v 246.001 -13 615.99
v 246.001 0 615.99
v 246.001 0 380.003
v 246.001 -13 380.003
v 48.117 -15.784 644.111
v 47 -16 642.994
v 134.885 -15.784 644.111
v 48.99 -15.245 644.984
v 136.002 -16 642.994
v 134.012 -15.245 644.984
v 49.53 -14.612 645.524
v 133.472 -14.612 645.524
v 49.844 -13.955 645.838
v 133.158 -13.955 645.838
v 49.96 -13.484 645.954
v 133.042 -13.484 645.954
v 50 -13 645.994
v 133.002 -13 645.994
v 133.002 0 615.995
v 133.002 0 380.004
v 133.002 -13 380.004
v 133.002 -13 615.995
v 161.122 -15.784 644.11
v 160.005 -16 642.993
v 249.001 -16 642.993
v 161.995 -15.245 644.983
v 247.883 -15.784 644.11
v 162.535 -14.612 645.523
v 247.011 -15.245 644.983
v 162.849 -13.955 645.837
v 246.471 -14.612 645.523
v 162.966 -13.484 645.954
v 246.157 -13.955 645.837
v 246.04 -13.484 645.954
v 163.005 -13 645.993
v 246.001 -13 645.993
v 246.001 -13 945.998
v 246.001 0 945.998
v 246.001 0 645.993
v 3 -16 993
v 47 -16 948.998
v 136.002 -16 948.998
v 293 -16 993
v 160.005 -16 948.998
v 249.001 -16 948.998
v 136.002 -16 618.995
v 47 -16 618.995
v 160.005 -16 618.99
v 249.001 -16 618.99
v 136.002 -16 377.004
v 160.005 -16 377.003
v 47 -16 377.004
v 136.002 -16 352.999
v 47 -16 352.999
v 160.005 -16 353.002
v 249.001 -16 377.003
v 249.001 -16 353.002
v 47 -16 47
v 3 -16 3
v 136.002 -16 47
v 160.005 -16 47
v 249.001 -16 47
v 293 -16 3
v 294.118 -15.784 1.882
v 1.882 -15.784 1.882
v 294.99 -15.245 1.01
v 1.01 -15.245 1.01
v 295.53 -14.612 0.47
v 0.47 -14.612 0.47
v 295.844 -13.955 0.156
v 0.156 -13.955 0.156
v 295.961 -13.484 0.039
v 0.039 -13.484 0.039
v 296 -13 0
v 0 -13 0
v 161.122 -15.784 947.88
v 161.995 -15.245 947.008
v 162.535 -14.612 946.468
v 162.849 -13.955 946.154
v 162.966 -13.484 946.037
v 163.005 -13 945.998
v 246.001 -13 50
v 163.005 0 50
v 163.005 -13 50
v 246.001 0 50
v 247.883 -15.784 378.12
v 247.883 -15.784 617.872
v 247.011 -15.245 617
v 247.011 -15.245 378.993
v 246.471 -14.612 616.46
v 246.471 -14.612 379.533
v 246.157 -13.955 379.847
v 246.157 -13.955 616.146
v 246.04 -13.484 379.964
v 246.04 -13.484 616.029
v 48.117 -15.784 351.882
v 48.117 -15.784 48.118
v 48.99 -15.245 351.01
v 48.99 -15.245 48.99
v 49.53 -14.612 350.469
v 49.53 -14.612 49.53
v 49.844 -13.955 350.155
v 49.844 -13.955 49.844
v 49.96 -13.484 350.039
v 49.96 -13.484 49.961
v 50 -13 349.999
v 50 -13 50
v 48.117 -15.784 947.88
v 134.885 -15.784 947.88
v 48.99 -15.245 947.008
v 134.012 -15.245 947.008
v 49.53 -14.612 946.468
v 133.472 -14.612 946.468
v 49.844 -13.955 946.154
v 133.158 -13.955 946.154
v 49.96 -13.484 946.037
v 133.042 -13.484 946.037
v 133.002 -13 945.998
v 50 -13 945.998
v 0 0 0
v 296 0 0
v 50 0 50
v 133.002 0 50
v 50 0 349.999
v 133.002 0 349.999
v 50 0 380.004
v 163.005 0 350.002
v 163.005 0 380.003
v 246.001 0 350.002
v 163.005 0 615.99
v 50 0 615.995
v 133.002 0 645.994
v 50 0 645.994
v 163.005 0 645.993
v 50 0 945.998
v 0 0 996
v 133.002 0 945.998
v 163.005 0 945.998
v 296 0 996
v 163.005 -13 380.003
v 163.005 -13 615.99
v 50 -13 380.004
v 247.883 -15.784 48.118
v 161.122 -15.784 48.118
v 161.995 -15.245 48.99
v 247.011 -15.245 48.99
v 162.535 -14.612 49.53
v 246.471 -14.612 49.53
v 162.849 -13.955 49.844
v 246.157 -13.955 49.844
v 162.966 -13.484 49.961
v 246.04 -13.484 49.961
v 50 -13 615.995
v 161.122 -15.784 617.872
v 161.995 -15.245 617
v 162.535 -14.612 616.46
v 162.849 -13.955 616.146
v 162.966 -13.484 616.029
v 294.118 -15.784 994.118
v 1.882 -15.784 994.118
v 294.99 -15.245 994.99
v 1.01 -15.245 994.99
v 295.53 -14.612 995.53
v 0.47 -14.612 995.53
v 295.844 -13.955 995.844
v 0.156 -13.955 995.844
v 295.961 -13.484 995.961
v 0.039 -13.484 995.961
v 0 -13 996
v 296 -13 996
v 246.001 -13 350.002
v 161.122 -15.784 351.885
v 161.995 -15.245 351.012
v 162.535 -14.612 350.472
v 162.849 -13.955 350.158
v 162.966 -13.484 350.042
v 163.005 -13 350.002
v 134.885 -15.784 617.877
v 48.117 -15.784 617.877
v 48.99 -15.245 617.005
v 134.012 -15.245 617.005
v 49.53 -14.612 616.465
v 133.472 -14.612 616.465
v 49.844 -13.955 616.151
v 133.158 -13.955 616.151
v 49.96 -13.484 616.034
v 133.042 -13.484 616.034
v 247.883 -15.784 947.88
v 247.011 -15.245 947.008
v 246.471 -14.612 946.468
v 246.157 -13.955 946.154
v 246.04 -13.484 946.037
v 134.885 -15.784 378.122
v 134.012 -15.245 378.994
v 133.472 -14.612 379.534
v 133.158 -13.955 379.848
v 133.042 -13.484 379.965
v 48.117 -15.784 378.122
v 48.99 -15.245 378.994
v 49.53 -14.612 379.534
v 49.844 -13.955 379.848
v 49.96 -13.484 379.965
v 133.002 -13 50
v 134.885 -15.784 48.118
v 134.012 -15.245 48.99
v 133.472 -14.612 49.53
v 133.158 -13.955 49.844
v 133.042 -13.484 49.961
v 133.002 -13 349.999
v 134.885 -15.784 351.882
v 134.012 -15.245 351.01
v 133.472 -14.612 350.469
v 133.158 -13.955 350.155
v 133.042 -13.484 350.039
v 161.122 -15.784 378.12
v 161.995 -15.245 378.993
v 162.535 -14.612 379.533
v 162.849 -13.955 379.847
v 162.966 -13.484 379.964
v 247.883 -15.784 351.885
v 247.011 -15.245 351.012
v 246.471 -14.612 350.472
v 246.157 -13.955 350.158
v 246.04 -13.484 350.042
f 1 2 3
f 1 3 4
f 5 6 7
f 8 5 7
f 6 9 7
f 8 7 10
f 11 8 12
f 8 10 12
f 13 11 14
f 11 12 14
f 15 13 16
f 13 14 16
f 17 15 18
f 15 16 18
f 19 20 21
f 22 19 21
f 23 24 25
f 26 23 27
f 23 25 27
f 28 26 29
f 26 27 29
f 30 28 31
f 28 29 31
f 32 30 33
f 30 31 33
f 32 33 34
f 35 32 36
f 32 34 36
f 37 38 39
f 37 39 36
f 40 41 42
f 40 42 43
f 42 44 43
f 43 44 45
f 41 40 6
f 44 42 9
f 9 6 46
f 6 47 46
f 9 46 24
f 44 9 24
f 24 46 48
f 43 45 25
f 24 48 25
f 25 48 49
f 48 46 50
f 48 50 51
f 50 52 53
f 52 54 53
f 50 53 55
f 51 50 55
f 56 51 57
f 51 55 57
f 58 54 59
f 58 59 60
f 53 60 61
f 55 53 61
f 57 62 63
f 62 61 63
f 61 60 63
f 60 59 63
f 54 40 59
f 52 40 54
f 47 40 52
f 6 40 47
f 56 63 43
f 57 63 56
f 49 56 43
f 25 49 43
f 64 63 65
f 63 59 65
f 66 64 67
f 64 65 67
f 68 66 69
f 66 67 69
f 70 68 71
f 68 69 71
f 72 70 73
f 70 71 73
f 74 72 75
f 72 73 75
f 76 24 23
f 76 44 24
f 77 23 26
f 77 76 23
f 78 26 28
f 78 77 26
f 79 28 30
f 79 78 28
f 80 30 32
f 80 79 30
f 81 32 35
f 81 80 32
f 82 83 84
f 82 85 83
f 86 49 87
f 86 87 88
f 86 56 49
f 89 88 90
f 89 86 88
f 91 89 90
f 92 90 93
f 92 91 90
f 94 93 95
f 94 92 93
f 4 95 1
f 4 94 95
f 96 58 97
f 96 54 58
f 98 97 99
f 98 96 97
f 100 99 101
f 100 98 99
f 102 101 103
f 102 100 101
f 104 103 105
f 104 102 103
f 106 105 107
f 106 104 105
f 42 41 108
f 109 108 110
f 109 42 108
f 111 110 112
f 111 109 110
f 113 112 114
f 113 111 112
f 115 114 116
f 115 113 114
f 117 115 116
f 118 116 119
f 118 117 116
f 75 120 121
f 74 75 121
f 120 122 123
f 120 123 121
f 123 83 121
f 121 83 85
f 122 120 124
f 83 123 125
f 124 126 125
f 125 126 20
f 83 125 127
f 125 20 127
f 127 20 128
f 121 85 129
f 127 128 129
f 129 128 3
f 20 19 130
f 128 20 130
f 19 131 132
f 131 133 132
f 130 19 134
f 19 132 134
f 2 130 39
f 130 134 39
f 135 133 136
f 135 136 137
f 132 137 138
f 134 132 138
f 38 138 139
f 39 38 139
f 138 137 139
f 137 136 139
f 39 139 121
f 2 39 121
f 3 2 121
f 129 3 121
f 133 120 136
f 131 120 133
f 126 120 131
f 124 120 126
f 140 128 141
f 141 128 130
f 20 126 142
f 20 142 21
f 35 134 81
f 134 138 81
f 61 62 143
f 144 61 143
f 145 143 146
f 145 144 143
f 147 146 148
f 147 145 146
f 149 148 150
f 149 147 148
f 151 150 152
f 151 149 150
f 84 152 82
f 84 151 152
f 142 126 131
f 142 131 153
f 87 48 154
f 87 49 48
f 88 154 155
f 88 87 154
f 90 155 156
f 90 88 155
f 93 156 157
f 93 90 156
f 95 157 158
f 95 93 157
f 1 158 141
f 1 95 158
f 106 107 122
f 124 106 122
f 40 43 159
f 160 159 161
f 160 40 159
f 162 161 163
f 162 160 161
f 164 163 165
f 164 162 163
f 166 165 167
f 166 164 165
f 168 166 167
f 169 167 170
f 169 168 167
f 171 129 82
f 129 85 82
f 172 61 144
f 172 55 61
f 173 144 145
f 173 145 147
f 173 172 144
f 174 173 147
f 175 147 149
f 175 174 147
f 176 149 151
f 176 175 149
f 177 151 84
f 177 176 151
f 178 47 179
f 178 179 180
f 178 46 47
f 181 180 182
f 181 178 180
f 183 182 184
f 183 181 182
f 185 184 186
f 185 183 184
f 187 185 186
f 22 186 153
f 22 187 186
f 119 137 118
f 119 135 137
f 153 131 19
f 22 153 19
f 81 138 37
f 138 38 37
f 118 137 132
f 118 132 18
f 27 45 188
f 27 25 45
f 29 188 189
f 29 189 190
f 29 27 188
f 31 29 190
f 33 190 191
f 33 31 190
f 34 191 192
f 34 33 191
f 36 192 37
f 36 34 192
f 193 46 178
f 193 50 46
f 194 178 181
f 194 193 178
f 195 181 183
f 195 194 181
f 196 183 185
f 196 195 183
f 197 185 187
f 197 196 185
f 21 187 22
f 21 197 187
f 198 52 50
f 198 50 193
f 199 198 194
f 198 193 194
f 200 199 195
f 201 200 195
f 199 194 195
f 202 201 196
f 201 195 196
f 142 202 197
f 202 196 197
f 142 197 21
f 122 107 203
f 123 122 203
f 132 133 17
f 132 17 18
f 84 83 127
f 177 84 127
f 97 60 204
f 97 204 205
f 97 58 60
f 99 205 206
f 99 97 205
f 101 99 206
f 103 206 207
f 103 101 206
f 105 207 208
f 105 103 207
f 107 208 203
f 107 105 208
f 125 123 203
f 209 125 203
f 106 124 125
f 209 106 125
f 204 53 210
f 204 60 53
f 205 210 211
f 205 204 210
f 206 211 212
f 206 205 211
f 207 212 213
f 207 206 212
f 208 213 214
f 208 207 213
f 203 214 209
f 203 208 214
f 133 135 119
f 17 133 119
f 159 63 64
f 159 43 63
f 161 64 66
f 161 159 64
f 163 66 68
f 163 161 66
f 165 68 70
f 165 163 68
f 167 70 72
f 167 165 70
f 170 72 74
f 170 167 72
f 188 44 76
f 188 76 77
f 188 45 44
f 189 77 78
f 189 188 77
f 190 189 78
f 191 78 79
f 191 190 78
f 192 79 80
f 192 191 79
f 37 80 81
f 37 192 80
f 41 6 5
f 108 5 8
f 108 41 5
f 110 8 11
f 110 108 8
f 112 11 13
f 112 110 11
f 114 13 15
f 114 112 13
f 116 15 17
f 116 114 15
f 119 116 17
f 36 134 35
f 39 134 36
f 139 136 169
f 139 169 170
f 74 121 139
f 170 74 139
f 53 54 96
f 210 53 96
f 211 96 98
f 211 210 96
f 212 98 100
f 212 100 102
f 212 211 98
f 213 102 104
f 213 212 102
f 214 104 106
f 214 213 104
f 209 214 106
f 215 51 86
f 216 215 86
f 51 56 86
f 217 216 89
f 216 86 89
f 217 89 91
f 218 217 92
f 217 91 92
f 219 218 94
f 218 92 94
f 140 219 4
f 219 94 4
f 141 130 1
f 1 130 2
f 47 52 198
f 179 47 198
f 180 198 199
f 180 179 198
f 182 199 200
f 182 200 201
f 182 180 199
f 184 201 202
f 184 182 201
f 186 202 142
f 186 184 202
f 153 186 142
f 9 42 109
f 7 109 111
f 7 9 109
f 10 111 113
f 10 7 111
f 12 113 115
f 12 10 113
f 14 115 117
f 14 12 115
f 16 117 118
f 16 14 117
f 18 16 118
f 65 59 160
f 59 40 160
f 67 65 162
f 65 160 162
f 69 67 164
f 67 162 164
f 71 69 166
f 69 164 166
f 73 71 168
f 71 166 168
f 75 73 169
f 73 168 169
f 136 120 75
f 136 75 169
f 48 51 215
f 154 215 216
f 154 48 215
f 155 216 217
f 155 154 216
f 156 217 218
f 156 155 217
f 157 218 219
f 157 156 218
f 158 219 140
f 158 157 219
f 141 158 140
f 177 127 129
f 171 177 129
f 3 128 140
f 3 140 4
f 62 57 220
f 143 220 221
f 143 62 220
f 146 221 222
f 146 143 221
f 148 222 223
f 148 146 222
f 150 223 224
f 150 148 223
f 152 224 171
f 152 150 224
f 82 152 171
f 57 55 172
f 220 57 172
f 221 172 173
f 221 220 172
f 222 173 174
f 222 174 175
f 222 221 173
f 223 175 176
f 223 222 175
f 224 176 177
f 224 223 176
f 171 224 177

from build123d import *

# Parameters (mm, degrees)
F0_W      = 28.8499742746
F0_H      = 37.8827601671
F1_DEPTH  = 16
F2_DEPTH  = 296
F3_DEPTH  = 996
F4_W      = 199.8313069344
F4_H      = 801.1276721954
F5_DEPTH  = 5
F6_DEPTH  = 39.21
F7_DEPTH  = 2.24
F8_DEPTH  = 55.66
F9_DEPTH  = 1.59
F10_W     = 54.77245152
F10_H     = 895.9976721954
F11_DEPTH = 5
F12_DEPTH = 5.86
F13_DEPTH = 18.91
F14_W     = 83.0026693535
F14_H     = 34.9487662315
F14_H_2   = 55.274695158
F15_W     = 82.9961860609
F15_H     = 44.8832511902
F15_H_2   = 52.5203943253
F16_DEPTH = 5
F17_DEPTH = 300
F18_DEPTH = 300
F19_DEPTH = 324.79
F20_DEPTH = 324.79
F21_DEPTH = 250
F22_DEPTH = 250
F23_DEPTH = 100
F24_DEPTH = 100
F25_DEPTH = 50
F26_DEPTH = 50
F27_DEPTH = 134.02
F28_DEPTH = 100
F29_DEPTH = 100
F30_DEPTH = 100
F31_DEPTH = 50
F32_DEPTH = 54.95
F33_DEPTH = 50
F34_DEPTH = 109.29
F35_DEPTH = 14.88
F36_DEPTH = 230.15
F37_DEPTH = 230.15
F38_DEPTH = 22.52
F39_DEPTH = 77.2
F40_DEPTH = 77.2
F41_DEPTH = 11
F42_R     = 3


with BuildPart() as f1:
    # F0 (on Front) → F1 (new body)
    with BuildSketch(Plane.XZ):
        with Locations((14.4249871373, 18.9413800836)):
            Rectangle(F0_W, F0_H)
    extrude(amount=F1_DEPTH)

    # F2 (add): a face of the model
    f2_faces = [f1.faces().sort_by_distance(p)[0] for p in [
        (0, -8, 18.9413800836),
    ]]
    extrude(f2_faces, amount=-F2_DEPTH)

    # F3 (add): a face of the model
    f3_faces = [f1.faces().sort_by_distance(p)[0] for p in [
        (148, -8, 0),
    ]]
    extrude(f3_faces, amount=-F3_DEPTH)

    # F4 (on face) → F5 (cut)
    with BuildSketch(Plane.XZ.offset(16)):
        with Locations((148.3252942562, 506.2239170074)):
            Rectangle(F4_W, F4_H)
    extrude(amount=-F5_DEPTH, mode=Mode.SUBTRACT)

    # F6 (cut): a face of the model
    f6_faces = [f1.faces().sort_by_distance(p)[0] for p in [
        (148.3252942562, -13.5, 906.7877531052),
    ]]
    extrude(f6_faces, amount=-F6_DEPTH, mode=Mode.SUBTRACT)

    # F7 (add): a face of the model
    f7_faces = [f1.faces().sort_by_distance(p)[0] for p in [
        (248.2409477234, -13.5, 525.8289170074),
    ]]
    extrude(f7_faces, amount=F7_DEPTH)

    # F8 (cut): a face of the model
    f8_faces = [f1.faces().sort_by_distance(p)[0] for p in [
        (147.2052942562, -13.5, 105.6600809097),
    ]]
    extrude(f8_faces, amount=-F8_DEPTH, mode=Mode.SUBTRACT)

    # F9 (add): a face of the model
    f9_faces = [f1.faces().sort_by_distance(p)[0] for p in [
        (48.409640789, -13.5, 497.9989170074),
    ]]
    extrude(f9_faces, amount=F9_DEPTH)

    # F10 (on face) → F11 (join)
    with BuildSketch(Plane.XZ.offset(11)):
        with Locations((154.5285359025, 497.9989170074)):
            Rectangle(F10_W, F10_H)
    extrude(amount=F11_DEPTH)

    # F12 (cut): a face of the model
    f12_faces = [f1.faces().sort_by_distance(p)[0] for p in [
        (127.1423101425, -13.5, 497.9989170074),
    ]]
    extrude(f12_faces, amount=-F12_DEPTH, mode=Mode.SUBTRACT)

    # F13 (cut): a face of the model
    f13_faces = [f1.faces().sort_by_distance(p)[0] for p in [
        (181.9147616625, -13.5, 497.9989170074),
    ]]
    extrude(f13_faces, amount=-F13_DEPTH, mode=Mode.SUBTRACT)

    # F14 (on face) + F15 (on face) → F16 (join)
    with BuildSketch(Plane.XZ.offset(11)):
        with Locations((91.5009754658, 853.3093035221)):
            Rectangle(F14_W, F14_H)
        with Locations((91.5009754658, 511.6568356752)):
            Rectangle(F14_W, F14_H_2)
    with BuildSketch(Plane.XZ.offset(11)):
        with Locations((204.5028546929, 853.7013530731)):
            Rectangle(F15_W, F15_H)
        with Locations((204.5028546929, 576.5425562859)):
            Rectangle(F15_W, F15_H_2)
    extrude(amount=F16_DEPTH)

    # F17 (add): faces of the model
    f17_faces = [f1.faces().sort_by_distance(p)[0] for p in [
        (204.5028546929, -13.5, 550.2823591232),
        (91.5009754658, -13.5, 484.0194880962),
    ]]
    extrude(f17_faces, amount=F17_DEPTH)

    # F18 (cut): faces of the model
    f18_faces = [f1.faces().sort_by_distance(p)[0] for p in [
        (91.5009754658, -13.5, 539.2941832542),
        (204.5028546929, -13.5, 602.8027534485),
    ]]
    extrude(f18_faces, amount=-F18_DEPTH, mode=Mode.SUBTRACT)

    # F19 (add): a face of the model
    f19_faces = [f1.faces().sort_by_distance(p)[0] for p in [
        (91.5009754658, -13.5, 835.8349204063),
    ]]
    extrude(f19_faces, amount=F19_DEPTH)

    # F20 (cut): a face of the model
    f20_faces = [f1.faces().sort_by_distance(p)[0] for p in [
        (91.5009754658, -13.5, 870.7836866379),
    ]]
    extrude(f20_faces, amount=-F20_DEPTH, mode=Mode.SUBTRACT)

    # F21 (add): a face of the model
    f21_faces = [f1.faces().sort_by_distance(p)[0] for p in [
        (91.5009754658, -13.5, 239.2941832542),
    ]]
    extrude(f21_faces, amount=F21_DEPTH)

    # F22 (cut): a face of the model
    f22_faces = [f1.faces().sort_by_distance(p)[0] for p in [
        (91.5009754658, -13.5, 184.0194880962),
    ]]
    extrude(f22_faces, amount=-F22_DEPTH, mode=Mode.SUBTRACT)

    # F23 (add): a face of the model
    f23_faces = [f1.faces().sort_by_distance(p)[0] for p in [
        (91.5009754658, -13.5, 545.9936866379),
    ]]
    extrude(f23_faces, amount=F23_DEPTH)

    # F24 (cut): a face of the model
    f24_faces = [f1.faces().sort_by_distance(p)[0] for p in [
        (91.5009754658, -13.5, 511.0449204063),
    ]]
    extrude(f24_faces, amount=-F24_DEPTH, mode=Mode.SUBTRACT)

    # F25 (add): a face of the model
    f25_faces = [f1.faces().sort_by_distance(p)[0] for p in [
        (91.5009754658, -13.5, 645.9936866379),
    ]]
    extrude(f25_faces, amount=F25_DEPTH)

    # F26 (cut): a face of the model
    f26_faces = [f1.faces().sort_by_distance(p)[0] for p in [
        (91.5009754658, -13.5, 611.0449204063),
    ]]
    extrude(f26_faces, amount=-F26_DEPTH, mode=Mode.SUBTRACT)

    # F27 (add): a face of the model
    f27_faces = [f1.faces().sort_by_distance(p)[0] for p in [
        (91.5009754658, -13.5, 434.0194880962),
    ]]
    extrude(f27_faces, amount=F27_DEPTH)

    # F28 (cut): a face of the model
    f28_faces = [f1.faces().sort_by_distance(p)[0] for p in [
        (91.5009754658, -13.5, 299.9994880962),
    ]]
    extrude(f28_faces, amount=-F28_DEPTH, mode=Mode.SUBTRACT)

    # F29 (add): a face of the model
    f29_faces = [f1.faces().sort_by_distance(p)[0] for p in [
        (91.5009754658, -13.5, 661.0449204063),
    ]]
    extrude(f29_faces, amount=F29_DEPTH)

    # F30 (cut): a face of the model
    f30_faces = [f1.faces().sort_by_distance(p)[0] for p in [
        (91.5009754658, -13.5, 695.9936866379),
    ]]
    extrude(f30_faces, amount=-F30_DEPTH, mode=Mode.SUBTRACT)

    # F31 (add): a face of the model
    f31_faces = [f1.faces().sort_by_distance(p)[0] for p in [
        (91.5009754658, -13.5, 595.9936866379),
    ]]
    extrude(f31_faces, amount=F31_DEPTH)

    # F32 (cut): a face of the model
    f32_faces = [f1.faces().sort_by_distance(p)[0] for p in [
        (91.5009754658, -13.5, 561.0449204063),
    ]]
    extrude(f32_faces, amount=-F32_DEPTH, mode=Mode.SUBTRACT)

    # F33 (add): a face of the model
    f33_faces = [f1.faces().sort_by_distance(p)[0] for p in [
        (91.5009754658, -13.5, 399.9994880962),
    ]]
    extrude(f33_faces, amount=F33_DEPTH)

    # F34 (cut): a face of the model
    f34_faces = [f1.faces().sort_by_distance(p)[0] for p in [
        (91.5009754658, -13.5, 489.2941832542),
    ]]
    extrude(f34_faces, amount=-F34_DEPTH, mode=Mode.SUBTRACT)

    # F35 (cut): a face of the model
    f35_faces = [f1.faces().sort_by_distance(p)[0] for p in [
        (204.5028546929, -13.5, 831.259727478),
    ]]
    extrude(f35_faces, amount=-F35_DEPTH, mode=Mode.SUBTRACT)

    # F36 (add): a face of the model
    f36_faces = [f1.faces().sort_by_distance(p)[0] for p in [
        (204.5028546929, -13.5, 846.139727478),
    ]]
    extrude(f36_faces, amount=F36_DEPTH)

    # F37 (cut): a face of the model
    f37_faces = [f1.faces().sort_by_distance(p)[0] for p in [
        (204.5028546929, -13.5, 876.1429786682),
    ]]
    extrude(f37_faces, amount=-F37_DEPTH, mode=Mode.SUBTRACT)

    # F38 (cut): a face of the model
    f38_faces = [f1.faces().sort_by_distance(p)[0] for p in [
        (204.5028546929, -13.5, 250.2823591232),
    ]]
    extrude(f38_faces, amount=-F38_DEPTH, mode=Mode.SUBTRACT)

    # F39 (add): a face of the model
    f39_faces = [f1.faces().sort_by_distance(p)[0] for p in [
        (204.5028546929, -13.5, 302.8027534485),
    ]]
    extrude(f39_faces, amount=F39_DEPTH)

    # F40 (cut): a face of the model
    f40_faces = [f1.faces().sort_by_distance(p)[0] for p in [
        (204.5028546929, -13.5, 272.8023591232),
    ]]
    extrude(f40_faces, amount=-F40_DEPTH, mode=Mode.SUBTRACT)

    # F41 (cut): faces of the model
    f41_faces = [f1.faces().sort_by_distance(p)[0] for p in [
        (91.5009754658, -11, 795.9957198715),
        (204.5028546929, -11, 795.9953658867),
        (204.5028546929, -11, 497.9962404633),
        (91.5009754658, -11, 497.9995518303),
        (91.5009754658, -11, 199.999784503),
        (204.5028546929, -11, 200.0012200165),
    ]]
    extrude(f41_faces, amount=-F41_DEPTH, mode=Mode.SUBTRACT)

    # F42
    f42_edges = [f1.edges().sort_by_distance(p)[0] for p in [
        (0, -16, 498),
        (148, -16, 0),
        (296, -16, 498),
        (148, -16, 996),
        (133.00231, -16, 199.999785),
        (91.500975, -16, 50.000081),
        (49.999641, -16, 199.999785),
        (91.500975, -16, 349.999488),
        (246.000948, -16, 200.00122),
        (204.502855, -16, 50.000081),
        (163.004762, -16, 200.00122),
        (204.502855, -16, 350.002359),
        (163.004762, -16, 497.99624),
        (204.502855, -16, 615.989727),
        (246.000948, -16, 497.99624),
        (204.502855, -16, 380.002753),
        (91.500975, -16, 615.99492),
        (133.00231, -16, 497.999552),
        (91.500975, -16, 380.004183),
        (49.999641, -16, 497.999552),
        (49.999641, -16, 795.99572),
        (91.500975, -16, 945.997753),
        (133.00231, -16, 795.99572),
        (91.500975, -16, 645.993687),
        (163.004762, -16, 795.995366),
        (204.502855, -16, 945.997753),
        (246.000948, -16, 795.995366),
        (204.502855, -16, 645.992979),
    ]]
    fillet(f42_edges, radius=F42_R)


solid = f1.part
